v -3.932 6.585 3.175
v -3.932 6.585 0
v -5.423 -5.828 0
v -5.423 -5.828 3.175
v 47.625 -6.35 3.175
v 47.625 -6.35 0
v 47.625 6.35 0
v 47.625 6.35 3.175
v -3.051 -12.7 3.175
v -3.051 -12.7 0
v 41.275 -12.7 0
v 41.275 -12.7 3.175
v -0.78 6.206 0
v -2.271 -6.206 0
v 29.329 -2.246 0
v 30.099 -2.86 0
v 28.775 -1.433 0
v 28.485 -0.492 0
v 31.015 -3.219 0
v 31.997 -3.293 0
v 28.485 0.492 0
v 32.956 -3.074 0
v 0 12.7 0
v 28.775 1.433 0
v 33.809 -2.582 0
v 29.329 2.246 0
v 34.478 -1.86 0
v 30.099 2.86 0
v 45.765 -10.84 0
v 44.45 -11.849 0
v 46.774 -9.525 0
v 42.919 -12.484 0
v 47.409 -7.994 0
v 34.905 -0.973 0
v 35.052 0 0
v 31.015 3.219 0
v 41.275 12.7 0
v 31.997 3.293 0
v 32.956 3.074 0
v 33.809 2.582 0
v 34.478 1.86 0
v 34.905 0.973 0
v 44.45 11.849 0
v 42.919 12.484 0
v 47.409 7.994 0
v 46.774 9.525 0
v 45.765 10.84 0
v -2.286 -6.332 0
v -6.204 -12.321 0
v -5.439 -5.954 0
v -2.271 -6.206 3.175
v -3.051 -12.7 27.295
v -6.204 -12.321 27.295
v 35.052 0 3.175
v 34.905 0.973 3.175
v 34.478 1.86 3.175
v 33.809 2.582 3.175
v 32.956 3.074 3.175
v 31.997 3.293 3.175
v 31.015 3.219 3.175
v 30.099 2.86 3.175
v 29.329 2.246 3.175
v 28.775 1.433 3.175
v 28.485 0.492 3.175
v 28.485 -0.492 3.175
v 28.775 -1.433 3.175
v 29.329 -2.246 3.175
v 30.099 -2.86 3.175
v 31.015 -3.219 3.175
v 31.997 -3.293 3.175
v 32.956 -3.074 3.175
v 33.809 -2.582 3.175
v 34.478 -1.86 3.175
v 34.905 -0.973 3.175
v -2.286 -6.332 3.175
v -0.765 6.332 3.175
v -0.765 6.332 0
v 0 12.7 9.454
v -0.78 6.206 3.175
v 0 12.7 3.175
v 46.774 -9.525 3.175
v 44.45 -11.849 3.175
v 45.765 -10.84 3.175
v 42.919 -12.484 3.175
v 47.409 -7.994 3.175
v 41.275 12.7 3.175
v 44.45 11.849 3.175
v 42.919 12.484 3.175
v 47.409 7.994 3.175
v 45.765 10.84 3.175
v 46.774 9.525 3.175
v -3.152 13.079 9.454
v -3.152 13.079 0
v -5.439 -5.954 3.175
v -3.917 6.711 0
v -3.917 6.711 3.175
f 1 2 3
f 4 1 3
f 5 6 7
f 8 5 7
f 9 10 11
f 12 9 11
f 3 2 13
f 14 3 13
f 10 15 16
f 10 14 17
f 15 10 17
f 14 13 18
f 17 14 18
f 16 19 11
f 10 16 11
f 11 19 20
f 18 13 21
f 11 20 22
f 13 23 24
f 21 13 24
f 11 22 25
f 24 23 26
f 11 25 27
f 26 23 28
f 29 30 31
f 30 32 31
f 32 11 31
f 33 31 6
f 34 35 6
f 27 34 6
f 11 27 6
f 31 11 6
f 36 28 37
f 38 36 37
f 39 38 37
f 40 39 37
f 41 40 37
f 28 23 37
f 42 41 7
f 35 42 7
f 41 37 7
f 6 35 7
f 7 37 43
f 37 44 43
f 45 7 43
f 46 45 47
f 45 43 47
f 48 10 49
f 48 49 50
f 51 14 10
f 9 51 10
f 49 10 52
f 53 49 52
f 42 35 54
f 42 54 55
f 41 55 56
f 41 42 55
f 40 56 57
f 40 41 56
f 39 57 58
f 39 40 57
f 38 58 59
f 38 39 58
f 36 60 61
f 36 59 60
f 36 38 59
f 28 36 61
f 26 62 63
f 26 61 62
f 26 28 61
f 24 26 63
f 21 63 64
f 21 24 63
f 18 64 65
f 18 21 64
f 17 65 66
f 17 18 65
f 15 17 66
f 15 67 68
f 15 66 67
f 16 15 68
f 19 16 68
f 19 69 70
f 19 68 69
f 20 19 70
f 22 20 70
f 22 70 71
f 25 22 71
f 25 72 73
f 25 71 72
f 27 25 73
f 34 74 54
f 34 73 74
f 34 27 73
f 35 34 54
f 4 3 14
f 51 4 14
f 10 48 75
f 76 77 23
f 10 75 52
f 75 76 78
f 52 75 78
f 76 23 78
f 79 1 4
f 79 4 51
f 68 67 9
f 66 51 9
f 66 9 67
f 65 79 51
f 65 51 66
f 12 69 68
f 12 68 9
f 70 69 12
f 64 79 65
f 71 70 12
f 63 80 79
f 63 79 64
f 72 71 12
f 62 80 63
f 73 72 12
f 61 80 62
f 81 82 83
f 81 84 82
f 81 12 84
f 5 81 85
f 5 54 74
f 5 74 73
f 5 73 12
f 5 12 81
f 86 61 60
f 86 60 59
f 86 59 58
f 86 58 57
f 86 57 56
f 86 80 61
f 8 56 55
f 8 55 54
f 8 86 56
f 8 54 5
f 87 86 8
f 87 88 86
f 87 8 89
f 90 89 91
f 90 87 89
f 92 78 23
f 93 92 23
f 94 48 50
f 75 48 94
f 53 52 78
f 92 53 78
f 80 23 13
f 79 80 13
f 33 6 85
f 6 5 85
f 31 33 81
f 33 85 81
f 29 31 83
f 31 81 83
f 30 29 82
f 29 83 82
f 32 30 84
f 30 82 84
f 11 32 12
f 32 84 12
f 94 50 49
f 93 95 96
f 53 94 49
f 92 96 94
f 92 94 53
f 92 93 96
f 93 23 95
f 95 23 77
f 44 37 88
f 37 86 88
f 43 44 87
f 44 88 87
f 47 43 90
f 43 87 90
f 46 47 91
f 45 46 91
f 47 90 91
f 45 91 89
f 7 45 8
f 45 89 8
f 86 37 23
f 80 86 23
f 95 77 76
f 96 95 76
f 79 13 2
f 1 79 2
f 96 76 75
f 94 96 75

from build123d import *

# Parameters (mm, degrees)
BOSS_EXTRUDE1_DEPTH     = 3.175
CUT_EXTRUDE1_DEPTH      = 50.391408666
CUT_EXTRUDE1_DEPTH_BACK = 50.391408666
SKETCH3_R               = 3.302
SKETCH2_W               = 3.175
SKETCH2_H               = 6.4135
BOSS_EXTRUDE2_DEPTH     = 3.175
FILLET1_R               = 6.35


with BuildPart() as part:
    # Sketch1 → Boss-Extrude1 (new body)
    with BuildSketch(Plane.XY):
        Polygon((0, 12.7), (-3.051249826, -12.7), (0, -12.7), (47.625, -12.7), (47.625, 12.7), align=None)
        Polygon((-2.271161455, -6.206187377), (-0.780088372, 6.206187377), (-3.932424596, 6.584871053), (-5.42349768, -5.827503701), align=None)
    extrude(amount=BOSS_EXTRUDE1_DEPTH)

    # Sketch3 → Cut-Extrude1 (cut, two sides: drawn at the far end of the back side and taken through both)
    with BuildSketch(Plane.XY.offset(3.175).offset(-CUT_EXTRUDE1_DEPTH_BACK)):
        with Locations((31.75, 0)):
            Circle(SKETCH3_R)
    extrude(amount=CUT_EXTRUDE1_DEPTH + CUT_EXTRUDE1_DEPTH_BACK, mode=Mode.SUBTRACT)

    # Fillet1
    fillet1_edges = [part.edges().sort_by_distance(p)[0] for p in [
        (47.625, 12.7, 1.5875),
        (47.625, -12.7, 1.5875),
    ]]
    fillet(fillet1_edges, radius=FILLET1_R)


with BuildPart() as body_2:
    # Sketch2 → Boss-Extrude2 (new body)
    with BuildSketch(Plane(origin=(-1.503922228, 0.180663088, 0), x_dir=(0, 0, 1), z_dir=(-0.9928618030717177, 0.11927044898539502, 0))):
        with Locations((1.5875, -9.766518836)):
            Rectangle(SKETCH2_W, SKETCH2_H)
        Polygon((0, 12.609344899), (0, 6.195844899), (3.175, 6.195844899), (3.175, -6.432768836), (3.175, -6.559768836), (3.175, -12.973268836), (27.295308913, -12.973268836), (9.453791039, 12.609344899), align=None)
    extrude(amount=BOSS_EXTRUDE2_DEPTH)


solid = Compound([part.part, body_2.part])
